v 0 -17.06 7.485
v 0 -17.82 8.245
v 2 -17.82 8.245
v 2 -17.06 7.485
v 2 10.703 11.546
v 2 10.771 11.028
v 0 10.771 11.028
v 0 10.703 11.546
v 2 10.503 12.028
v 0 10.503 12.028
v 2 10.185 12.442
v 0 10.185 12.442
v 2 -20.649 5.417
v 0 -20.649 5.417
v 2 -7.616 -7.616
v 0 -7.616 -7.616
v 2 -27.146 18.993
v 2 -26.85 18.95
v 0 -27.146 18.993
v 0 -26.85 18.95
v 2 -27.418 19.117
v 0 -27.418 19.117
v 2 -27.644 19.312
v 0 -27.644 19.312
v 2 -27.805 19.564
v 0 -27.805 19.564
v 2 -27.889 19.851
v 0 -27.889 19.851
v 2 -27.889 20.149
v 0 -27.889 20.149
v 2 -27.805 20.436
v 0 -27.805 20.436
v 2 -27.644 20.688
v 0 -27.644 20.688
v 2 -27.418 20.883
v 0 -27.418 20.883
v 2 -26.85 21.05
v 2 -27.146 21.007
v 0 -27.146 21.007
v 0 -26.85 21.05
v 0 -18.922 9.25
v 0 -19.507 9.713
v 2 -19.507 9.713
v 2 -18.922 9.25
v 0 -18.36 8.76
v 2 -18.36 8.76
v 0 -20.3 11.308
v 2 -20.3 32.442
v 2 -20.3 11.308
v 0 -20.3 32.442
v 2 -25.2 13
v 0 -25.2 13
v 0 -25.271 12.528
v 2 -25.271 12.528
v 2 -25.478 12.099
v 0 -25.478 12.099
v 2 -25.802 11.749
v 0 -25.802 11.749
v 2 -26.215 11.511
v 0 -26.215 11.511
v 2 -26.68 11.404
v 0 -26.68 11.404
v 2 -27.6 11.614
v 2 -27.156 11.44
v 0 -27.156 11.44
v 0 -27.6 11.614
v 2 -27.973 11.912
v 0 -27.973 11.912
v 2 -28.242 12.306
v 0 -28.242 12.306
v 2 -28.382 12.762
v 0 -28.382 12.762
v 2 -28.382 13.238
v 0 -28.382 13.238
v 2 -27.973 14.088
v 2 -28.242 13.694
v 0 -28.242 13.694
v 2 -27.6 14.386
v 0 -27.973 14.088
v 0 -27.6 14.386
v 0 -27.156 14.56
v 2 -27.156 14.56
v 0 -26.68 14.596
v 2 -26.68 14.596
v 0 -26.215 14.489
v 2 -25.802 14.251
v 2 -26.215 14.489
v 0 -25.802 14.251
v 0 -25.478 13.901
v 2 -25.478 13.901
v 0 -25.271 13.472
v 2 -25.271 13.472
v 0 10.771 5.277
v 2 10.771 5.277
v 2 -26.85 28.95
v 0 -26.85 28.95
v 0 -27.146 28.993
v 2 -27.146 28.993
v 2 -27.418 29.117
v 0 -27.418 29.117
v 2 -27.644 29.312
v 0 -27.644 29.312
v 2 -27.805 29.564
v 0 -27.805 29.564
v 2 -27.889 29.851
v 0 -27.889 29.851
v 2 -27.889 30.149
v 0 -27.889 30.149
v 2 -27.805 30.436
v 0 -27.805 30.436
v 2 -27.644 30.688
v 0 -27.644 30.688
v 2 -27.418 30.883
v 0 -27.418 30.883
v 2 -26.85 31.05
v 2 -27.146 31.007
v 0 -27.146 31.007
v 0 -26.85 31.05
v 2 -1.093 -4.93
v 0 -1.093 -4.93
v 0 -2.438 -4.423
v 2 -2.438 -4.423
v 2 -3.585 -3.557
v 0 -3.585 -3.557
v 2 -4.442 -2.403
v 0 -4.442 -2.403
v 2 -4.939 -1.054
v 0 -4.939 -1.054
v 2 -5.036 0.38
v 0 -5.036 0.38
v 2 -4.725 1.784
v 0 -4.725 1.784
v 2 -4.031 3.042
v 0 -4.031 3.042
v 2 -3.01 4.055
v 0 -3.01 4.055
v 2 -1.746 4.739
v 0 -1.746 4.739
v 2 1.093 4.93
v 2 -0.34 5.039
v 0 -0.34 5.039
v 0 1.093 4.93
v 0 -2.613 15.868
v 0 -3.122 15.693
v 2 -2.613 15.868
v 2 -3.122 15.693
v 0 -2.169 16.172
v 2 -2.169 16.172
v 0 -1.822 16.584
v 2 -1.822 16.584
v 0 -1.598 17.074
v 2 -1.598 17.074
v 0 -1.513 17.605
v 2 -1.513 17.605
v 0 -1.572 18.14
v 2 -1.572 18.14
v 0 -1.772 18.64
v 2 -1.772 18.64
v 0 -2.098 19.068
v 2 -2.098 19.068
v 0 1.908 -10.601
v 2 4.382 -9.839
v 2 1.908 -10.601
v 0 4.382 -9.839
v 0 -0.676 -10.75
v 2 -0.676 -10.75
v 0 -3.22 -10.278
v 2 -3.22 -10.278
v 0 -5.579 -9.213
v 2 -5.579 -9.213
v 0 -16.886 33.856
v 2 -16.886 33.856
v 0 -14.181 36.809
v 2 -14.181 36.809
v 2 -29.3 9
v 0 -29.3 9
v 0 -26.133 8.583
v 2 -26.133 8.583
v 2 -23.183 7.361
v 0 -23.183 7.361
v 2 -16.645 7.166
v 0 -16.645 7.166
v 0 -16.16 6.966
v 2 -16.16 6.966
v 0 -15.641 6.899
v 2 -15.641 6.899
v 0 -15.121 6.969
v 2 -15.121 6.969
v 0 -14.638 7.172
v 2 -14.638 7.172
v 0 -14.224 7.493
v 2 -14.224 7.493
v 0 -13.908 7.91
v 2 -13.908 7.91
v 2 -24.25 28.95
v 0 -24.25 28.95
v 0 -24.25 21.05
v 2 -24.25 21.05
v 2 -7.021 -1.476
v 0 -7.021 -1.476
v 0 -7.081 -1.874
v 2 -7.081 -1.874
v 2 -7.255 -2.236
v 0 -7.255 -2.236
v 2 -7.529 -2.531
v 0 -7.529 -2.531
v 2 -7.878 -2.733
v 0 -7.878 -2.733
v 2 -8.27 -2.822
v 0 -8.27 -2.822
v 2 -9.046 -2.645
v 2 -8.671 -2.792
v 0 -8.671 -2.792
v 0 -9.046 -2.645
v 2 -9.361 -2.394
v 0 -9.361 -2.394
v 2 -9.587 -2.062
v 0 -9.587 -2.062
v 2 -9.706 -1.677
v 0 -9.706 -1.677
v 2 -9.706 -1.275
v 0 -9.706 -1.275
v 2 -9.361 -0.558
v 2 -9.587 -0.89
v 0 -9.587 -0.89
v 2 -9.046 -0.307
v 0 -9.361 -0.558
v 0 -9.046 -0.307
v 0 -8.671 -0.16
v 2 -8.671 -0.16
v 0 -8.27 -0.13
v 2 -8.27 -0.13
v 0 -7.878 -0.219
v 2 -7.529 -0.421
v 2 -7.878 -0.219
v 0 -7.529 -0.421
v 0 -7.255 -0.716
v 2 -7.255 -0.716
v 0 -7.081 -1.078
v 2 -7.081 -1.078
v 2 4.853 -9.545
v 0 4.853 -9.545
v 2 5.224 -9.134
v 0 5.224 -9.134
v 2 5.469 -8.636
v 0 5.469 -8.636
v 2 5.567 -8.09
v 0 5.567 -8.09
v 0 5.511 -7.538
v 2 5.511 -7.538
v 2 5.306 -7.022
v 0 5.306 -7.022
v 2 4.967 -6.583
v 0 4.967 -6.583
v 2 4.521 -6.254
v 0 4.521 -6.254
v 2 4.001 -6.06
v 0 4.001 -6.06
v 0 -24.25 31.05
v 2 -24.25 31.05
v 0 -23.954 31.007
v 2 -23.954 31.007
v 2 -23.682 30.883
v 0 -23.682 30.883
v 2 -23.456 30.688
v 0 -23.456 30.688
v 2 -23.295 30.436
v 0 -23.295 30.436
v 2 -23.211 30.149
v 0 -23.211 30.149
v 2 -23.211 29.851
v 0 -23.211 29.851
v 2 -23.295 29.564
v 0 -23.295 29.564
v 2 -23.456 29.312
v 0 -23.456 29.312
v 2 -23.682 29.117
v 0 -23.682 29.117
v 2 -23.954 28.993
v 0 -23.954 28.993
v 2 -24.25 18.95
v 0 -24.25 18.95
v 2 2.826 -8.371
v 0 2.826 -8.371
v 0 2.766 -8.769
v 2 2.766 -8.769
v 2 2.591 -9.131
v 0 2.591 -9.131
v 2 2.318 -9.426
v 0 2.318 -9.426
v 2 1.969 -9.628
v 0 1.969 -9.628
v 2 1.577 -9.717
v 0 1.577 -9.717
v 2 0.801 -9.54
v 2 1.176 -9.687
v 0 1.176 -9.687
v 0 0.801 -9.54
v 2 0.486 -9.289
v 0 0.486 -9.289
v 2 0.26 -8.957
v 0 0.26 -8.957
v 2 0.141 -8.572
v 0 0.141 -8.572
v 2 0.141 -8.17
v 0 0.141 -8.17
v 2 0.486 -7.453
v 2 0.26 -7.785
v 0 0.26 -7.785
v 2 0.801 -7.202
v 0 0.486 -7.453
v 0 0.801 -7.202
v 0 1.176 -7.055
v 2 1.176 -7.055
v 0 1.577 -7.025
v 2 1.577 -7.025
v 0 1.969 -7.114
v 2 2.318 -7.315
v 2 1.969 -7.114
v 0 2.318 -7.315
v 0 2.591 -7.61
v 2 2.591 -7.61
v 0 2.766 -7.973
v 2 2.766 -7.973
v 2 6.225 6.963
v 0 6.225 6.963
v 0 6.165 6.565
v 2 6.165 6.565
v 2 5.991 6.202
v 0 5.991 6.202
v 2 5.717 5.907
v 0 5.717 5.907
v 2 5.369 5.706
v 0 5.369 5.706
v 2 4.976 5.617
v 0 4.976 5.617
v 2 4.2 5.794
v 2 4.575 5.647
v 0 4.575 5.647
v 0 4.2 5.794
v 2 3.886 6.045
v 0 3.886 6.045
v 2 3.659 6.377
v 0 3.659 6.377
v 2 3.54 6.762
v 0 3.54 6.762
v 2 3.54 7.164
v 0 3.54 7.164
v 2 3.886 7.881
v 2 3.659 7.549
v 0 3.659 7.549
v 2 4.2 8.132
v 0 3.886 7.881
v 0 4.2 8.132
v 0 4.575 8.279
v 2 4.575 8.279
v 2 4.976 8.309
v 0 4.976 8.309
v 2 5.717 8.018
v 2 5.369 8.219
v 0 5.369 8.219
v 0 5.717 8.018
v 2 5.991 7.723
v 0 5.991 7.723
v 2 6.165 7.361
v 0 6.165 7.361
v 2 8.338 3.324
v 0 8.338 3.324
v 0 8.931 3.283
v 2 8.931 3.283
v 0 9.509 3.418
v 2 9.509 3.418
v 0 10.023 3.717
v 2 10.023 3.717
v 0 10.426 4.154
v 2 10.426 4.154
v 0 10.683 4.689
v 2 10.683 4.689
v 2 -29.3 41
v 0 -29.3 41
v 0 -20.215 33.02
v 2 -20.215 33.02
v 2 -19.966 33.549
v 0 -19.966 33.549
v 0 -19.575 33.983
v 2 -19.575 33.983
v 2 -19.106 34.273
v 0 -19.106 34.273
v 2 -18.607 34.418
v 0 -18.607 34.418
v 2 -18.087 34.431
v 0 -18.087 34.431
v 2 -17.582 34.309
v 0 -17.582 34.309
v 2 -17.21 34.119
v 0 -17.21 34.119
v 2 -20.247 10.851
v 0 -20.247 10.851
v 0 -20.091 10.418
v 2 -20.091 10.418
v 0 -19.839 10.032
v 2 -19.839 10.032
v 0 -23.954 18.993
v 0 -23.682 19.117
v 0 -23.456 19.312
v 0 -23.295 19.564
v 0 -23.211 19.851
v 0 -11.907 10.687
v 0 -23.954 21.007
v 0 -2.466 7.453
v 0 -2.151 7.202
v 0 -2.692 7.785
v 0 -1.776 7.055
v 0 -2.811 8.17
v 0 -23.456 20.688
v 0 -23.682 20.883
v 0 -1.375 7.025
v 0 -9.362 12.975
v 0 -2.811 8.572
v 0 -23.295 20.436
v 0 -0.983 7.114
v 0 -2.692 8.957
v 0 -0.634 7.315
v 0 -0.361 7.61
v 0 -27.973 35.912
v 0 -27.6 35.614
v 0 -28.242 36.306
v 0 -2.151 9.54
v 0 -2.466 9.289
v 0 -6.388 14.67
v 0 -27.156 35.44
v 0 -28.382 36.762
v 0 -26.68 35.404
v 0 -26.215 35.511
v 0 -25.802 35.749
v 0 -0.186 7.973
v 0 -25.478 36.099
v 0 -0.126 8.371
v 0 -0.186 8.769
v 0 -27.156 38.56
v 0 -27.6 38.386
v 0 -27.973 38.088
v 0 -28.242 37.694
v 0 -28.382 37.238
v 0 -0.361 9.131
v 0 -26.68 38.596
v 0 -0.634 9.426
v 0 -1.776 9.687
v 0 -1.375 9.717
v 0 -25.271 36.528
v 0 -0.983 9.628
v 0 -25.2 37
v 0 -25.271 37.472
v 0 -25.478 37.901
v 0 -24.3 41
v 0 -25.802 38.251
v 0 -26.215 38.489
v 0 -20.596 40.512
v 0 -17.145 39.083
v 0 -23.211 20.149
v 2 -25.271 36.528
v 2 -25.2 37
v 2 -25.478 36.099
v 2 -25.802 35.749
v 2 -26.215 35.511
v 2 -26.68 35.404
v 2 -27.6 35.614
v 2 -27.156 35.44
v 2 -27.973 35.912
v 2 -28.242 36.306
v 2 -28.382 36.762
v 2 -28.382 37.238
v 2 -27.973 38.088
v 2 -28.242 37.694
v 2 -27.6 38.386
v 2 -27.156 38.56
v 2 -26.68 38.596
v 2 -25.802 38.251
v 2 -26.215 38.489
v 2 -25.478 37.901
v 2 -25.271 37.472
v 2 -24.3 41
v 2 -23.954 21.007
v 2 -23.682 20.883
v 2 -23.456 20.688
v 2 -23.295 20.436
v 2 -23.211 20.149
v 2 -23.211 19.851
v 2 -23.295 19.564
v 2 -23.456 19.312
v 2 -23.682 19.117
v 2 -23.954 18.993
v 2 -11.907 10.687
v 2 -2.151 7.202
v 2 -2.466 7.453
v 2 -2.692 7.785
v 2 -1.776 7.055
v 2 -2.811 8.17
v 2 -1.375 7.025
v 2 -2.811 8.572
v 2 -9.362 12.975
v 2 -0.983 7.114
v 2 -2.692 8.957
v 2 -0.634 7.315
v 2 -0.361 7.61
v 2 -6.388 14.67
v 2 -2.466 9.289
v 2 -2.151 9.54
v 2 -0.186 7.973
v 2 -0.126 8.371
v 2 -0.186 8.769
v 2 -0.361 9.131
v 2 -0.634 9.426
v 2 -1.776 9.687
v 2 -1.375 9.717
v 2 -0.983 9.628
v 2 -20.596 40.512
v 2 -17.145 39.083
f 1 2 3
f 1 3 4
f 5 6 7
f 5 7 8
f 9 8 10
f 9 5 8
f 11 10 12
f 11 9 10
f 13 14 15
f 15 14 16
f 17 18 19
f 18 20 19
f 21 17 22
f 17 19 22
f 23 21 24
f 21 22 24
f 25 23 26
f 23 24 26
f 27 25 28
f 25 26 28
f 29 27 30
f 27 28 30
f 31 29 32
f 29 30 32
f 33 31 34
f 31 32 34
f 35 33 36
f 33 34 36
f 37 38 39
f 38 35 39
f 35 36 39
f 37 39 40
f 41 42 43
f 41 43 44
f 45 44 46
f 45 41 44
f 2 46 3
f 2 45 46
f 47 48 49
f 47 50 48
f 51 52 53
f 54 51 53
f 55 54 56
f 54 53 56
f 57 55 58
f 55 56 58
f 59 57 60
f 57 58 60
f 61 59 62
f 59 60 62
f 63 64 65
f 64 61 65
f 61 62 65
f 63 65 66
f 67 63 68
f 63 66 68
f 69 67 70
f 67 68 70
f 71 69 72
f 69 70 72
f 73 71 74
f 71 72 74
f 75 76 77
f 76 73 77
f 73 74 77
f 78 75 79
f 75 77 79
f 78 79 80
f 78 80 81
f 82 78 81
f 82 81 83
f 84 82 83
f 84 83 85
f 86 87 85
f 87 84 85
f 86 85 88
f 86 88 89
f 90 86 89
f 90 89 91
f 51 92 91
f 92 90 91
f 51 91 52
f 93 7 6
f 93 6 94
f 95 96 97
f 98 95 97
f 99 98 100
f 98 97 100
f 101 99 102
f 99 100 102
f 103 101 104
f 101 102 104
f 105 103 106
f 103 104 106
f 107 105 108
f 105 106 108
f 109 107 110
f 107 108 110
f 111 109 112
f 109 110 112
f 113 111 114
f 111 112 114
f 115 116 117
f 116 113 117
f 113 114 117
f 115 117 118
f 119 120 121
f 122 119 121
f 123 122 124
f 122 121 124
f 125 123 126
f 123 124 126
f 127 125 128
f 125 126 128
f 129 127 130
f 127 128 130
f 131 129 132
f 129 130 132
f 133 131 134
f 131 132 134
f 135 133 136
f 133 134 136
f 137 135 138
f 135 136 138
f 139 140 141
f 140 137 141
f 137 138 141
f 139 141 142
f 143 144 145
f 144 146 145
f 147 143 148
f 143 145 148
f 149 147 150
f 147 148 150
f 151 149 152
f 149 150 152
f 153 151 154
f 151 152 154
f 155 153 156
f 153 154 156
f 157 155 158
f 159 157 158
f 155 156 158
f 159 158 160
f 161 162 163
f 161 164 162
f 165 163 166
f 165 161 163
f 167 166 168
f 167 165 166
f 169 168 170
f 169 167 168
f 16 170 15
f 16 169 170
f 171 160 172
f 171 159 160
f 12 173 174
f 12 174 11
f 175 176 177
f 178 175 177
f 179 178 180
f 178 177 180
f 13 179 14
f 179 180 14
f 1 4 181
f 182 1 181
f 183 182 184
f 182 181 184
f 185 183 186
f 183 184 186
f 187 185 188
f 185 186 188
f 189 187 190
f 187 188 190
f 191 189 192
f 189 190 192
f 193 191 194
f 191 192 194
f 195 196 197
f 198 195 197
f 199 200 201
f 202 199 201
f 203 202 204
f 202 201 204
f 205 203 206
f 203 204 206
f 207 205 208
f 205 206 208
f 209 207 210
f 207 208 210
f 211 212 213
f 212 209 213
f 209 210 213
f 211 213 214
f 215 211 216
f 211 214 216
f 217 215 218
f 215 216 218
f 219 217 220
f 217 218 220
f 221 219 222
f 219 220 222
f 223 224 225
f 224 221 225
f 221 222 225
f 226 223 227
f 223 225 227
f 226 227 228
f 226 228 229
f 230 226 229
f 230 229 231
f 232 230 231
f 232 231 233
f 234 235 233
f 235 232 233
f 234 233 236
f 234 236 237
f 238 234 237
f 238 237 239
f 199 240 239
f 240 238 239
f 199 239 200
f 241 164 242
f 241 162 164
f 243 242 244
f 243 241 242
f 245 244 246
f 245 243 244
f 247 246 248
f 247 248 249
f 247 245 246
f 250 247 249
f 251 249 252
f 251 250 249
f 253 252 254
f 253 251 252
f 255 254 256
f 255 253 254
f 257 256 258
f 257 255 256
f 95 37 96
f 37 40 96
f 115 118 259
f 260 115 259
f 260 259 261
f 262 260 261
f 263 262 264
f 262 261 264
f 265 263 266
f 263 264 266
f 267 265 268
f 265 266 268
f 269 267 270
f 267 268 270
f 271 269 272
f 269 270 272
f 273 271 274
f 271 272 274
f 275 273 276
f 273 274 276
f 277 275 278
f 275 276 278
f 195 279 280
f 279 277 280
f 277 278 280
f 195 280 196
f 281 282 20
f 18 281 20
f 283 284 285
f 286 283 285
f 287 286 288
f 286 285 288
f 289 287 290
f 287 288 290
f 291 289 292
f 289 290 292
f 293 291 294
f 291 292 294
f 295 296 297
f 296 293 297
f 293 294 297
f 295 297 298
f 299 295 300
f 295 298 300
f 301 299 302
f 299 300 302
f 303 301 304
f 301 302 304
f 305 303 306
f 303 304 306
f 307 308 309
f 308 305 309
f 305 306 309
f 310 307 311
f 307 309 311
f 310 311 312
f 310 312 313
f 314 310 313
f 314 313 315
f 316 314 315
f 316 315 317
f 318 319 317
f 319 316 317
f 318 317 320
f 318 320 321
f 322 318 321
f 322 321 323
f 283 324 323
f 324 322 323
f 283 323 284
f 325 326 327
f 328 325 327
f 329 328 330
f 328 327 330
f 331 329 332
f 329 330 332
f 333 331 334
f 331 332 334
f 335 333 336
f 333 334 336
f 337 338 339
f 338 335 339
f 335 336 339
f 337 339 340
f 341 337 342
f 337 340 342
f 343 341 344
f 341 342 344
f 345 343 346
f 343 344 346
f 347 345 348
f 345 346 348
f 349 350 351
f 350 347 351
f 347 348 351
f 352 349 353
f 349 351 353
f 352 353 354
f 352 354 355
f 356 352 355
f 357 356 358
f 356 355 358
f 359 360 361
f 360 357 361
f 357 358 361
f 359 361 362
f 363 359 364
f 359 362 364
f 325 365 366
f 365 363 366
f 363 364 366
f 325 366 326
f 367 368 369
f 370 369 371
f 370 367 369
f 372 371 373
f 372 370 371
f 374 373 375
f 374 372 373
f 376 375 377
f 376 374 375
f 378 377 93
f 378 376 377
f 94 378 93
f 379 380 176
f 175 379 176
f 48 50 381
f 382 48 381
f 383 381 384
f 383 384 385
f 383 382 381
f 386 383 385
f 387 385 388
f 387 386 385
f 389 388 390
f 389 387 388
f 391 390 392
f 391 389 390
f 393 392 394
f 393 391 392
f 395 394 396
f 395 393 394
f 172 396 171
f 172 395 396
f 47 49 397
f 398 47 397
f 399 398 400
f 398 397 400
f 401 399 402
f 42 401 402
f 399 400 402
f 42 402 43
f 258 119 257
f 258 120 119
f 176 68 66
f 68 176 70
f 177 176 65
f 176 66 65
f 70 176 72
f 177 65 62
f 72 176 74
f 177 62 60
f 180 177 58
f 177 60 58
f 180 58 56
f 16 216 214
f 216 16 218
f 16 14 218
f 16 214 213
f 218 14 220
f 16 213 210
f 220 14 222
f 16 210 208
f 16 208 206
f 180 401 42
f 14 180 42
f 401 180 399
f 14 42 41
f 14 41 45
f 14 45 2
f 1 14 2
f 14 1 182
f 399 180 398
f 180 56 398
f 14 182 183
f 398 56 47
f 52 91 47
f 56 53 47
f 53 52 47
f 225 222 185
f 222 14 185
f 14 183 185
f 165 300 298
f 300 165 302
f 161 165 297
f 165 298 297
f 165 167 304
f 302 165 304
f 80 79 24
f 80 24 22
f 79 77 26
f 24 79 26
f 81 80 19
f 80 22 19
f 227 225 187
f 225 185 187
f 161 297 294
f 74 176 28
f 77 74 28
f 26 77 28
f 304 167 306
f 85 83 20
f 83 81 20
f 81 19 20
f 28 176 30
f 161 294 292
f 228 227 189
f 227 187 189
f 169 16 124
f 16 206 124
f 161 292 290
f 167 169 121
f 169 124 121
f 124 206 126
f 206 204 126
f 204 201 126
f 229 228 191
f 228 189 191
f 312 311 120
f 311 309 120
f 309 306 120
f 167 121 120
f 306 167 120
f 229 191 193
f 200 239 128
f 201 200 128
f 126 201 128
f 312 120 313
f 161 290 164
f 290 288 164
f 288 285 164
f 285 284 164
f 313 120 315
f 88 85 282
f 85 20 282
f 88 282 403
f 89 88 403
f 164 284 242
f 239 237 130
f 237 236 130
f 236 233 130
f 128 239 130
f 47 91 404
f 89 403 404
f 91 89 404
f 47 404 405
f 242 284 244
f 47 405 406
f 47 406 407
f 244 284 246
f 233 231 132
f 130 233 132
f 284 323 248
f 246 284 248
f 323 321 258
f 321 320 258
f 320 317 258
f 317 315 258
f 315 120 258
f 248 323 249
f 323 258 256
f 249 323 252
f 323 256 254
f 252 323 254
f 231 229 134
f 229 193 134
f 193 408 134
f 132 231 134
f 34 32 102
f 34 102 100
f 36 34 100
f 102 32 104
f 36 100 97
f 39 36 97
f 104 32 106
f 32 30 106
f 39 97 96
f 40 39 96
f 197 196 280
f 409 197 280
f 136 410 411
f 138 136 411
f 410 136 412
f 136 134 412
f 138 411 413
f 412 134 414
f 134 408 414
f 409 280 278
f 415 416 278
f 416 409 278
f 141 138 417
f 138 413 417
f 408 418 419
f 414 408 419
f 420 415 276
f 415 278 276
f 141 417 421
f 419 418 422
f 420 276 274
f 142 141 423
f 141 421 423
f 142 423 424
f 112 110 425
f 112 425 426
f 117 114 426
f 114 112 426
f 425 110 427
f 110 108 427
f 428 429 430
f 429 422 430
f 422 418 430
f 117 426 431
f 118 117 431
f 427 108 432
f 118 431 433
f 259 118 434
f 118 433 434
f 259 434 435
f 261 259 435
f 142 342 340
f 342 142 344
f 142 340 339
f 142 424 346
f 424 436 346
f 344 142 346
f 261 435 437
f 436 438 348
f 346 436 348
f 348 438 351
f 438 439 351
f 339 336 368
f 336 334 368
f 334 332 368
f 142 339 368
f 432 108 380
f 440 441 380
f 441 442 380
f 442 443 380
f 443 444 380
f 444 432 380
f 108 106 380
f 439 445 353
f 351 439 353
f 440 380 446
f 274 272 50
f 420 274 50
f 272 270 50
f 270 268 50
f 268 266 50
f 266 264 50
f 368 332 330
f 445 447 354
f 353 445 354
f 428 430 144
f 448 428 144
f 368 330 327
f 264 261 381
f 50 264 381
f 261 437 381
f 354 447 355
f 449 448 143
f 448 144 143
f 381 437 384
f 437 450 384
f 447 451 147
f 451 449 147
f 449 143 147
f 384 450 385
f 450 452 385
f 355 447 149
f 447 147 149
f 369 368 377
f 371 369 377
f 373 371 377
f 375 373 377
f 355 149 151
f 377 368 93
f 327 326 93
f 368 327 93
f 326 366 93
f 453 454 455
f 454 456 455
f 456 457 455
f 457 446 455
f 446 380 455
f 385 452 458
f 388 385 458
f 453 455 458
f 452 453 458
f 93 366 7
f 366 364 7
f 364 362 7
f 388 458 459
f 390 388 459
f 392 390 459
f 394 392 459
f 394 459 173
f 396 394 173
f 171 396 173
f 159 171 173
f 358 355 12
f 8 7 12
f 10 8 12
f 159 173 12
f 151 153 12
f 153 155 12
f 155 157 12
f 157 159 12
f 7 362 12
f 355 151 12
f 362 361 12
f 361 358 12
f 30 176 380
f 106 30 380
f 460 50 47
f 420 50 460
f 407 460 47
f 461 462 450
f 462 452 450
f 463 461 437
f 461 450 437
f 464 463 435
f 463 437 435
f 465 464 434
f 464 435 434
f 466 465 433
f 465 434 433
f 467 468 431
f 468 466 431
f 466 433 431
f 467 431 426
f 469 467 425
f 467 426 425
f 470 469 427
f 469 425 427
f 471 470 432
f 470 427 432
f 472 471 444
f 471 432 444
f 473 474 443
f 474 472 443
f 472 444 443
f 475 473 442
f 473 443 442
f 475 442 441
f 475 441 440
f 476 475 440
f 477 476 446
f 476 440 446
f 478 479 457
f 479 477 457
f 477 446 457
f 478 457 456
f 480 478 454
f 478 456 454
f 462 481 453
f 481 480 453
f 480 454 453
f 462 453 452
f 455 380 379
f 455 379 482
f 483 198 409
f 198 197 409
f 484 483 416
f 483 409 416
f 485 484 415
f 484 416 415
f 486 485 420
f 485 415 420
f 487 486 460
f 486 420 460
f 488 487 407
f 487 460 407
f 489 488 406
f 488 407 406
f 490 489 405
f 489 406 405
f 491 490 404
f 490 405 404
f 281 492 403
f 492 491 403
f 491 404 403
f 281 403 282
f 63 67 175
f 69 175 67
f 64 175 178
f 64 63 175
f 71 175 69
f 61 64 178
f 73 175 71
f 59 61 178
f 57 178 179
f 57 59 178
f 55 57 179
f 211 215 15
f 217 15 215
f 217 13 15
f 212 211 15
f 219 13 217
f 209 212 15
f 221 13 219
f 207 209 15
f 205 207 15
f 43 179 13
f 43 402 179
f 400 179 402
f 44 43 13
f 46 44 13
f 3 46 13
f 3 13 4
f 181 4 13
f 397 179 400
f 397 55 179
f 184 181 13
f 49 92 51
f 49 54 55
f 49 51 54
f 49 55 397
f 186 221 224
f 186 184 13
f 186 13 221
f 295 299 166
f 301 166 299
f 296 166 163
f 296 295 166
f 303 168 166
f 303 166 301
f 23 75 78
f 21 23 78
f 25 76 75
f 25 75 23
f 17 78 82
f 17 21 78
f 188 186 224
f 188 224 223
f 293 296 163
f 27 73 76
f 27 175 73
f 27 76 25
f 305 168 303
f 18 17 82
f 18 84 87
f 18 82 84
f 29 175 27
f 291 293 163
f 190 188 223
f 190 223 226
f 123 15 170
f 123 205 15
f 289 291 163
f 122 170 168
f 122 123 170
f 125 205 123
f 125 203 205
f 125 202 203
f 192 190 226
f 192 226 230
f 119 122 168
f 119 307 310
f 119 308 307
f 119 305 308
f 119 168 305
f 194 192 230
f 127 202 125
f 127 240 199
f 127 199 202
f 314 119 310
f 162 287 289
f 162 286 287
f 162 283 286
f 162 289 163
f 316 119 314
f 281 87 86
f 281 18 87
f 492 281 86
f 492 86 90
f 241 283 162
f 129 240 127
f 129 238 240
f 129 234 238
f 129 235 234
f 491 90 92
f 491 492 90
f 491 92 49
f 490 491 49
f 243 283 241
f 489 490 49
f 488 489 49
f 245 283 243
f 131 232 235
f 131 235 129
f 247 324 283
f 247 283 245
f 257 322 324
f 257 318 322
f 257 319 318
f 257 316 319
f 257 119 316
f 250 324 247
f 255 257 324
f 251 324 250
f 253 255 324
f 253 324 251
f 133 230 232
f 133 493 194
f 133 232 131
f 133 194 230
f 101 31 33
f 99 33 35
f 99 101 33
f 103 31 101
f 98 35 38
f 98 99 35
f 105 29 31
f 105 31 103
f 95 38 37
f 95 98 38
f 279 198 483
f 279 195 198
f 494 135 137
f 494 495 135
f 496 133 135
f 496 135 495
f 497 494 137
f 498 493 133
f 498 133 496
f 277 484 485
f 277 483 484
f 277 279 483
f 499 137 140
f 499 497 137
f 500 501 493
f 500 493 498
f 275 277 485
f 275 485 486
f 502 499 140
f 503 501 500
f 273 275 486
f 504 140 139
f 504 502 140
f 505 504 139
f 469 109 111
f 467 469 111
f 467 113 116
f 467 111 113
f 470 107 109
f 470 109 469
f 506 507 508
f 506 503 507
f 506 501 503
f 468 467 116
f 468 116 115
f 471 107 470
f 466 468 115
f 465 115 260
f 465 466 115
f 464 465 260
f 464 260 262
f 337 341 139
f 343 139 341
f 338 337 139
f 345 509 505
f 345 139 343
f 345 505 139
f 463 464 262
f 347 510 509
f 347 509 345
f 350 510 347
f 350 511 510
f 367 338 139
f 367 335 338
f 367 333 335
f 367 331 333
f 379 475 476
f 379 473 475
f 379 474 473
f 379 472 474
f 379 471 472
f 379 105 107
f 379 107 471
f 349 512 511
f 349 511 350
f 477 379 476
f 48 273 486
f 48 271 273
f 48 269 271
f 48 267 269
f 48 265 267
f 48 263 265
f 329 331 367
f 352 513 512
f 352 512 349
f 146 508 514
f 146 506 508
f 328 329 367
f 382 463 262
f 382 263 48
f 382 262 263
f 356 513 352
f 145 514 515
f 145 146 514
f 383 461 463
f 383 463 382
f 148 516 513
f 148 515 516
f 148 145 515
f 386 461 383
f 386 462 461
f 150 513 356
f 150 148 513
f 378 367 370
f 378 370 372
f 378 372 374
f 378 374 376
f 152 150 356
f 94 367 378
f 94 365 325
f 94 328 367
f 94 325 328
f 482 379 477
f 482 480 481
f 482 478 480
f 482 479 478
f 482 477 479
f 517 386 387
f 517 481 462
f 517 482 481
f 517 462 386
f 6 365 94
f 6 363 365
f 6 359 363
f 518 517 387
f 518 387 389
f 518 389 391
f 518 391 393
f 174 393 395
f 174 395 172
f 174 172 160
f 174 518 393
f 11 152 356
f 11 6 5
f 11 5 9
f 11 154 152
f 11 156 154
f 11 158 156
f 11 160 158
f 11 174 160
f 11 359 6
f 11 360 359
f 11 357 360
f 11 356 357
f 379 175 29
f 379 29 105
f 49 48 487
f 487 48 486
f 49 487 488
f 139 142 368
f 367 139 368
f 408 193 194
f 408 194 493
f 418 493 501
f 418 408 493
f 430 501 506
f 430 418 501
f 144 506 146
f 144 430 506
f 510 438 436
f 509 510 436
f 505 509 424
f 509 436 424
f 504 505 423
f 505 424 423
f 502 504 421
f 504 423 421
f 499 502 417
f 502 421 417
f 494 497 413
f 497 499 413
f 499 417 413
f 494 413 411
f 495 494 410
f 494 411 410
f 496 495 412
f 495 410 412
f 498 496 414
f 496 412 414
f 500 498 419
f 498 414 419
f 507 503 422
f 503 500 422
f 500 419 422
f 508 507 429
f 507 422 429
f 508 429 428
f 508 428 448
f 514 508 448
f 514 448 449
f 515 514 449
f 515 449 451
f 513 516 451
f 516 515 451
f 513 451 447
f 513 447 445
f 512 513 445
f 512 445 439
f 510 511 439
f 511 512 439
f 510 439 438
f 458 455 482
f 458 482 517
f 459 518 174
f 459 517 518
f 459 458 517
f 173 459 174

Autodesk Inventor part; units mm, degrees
ref_plane "YZ Plane" through (0, 0, 0) normal (1, 0, 0) x (0, 1, 0)
ref_plane "XZ Plane" through (0, 0, 0) normal (0, 1, 0) x (-1, 0, 0)
ref_plane "XY Plane" through (0, 0, 0) normal (0, 0, 1) x (1, 0, 0)
sketch "スケッチ1" plane through (0, 0, 0) normal (1, 0, 0) x (0, 1, 0)
  line L0 (-29.3, 41) -> (-29.3, 9)
  line L1 (-29.3, 25) -> (-24.3, 25) construction
  line L2 (-26.8, 31) -> (-24.3, 31) construction
  line L3 (-24.3, 31) -> (-24.3, 19) construction
  line L4 (-24.3, 19) -> (-26.8, 19) construction
  line L5 (-26.8, 19) -> (-26.8, 31) construction
  line L6 (-26.8, 31) -> (-24.3, 19) construction
  line L7 (-24.3, 31) -> (-26.8, 19) construction
  circle A0 centre (-26.8, 37) radius 1.6
  line L8 (-26.8, 70.0011) -> (-26.8, -20.0011) construction
  line L9 (-29.3, 41) -> (-24.3, 41)
  circle A1 centre (0, 0) radius 5.05
  line L10 (-1.476, 8.3709) -> (1.476, -8.3709) construction
  circle A2 centre (-1.476, 8.3709) radius 1.35
  arc A3 (-7.6162, -7.6162) -> (10.7709, 0) centre (0, 0) ccw
  line L11 (-26.85, 31.05) -> (-24.25, 31.05)
  line L12 (-24.25, 31.05) -> (-24.25, 18.95)
  line L13 (-24.25, 18.95) -> (-26.85, 18.95)
  line L14 (-26.85, 18.95) -> (-26.85, 31.05)
  line L15 (-26.85, 31.05) -> (-24.25, 18.95) construction
  line L16 (-24.25, 31.05) -> (-26.85, 18.95) construction
  arc A4 (-24.25, 28.95) -> (-24.25, 31.05) centre (-24.25, 30) ccw
  line L17 (-25.55, 31) -> (-25.55, 19) construction
  arc A5 (-26.85, 31.05) -> (-26.85, 28.95) centre (-26.85, 30) ccw
  arc A6 (-24.25, 18.95) -> (-24.25, 21.05) centre (-24.25, 20) ccw
  arc A7 (-26.85, 21.05) -> (-26.85, 18.95) centre (-26.85, 20) ccw
  circle A8 centre (-26.8, 13) radius 1.6
  line L18 (-14.1813, 36.8087) -> (10.7709, 11.8566)
  line L19 (10.7709, 11.8566) -> (10.7709, 0)
  line L20 (-20.6489, 5.4166) -> (-7.6162, -7.6162)
  circle A9 centre (-6.9628, 4.8754) radius 1.35
  circle A10 centre (-8.3709, -1.476) radius 1.35
  circle A11 centre (0, 0) radius 16 construction
  arc A12 (-14.1813, 36.8087) -> (-24.3, 41) centre (-24.3, 26.6899) ccw
  line L21 (-20.3, 36.1924) -> (-20.3, 10.2769)
  arc A13 (-17.0097, 33.9803) -> (-20.3, 36.1924) centre (-24.3, 26.6899) ccw
  line L22 (6.7709, 10.0706) -> (6.7709, 8.438)
  circle A14 centre (-1.476, 8.3709) radius 2.4 construction
  line L23 (1.002, 15.9686) -> (-17.0097, 33.9803)
  arc A15 (-20.6489, 5.4166) -> (-29.3, 9) centre (-29.3, -3.2345) ccw
  circle A16 centre (-4.8754, -6.9628) radius 1.35
  circle A17 centre (1.476, -8.3709) radius 1.35
  arc A18 (-17.8205, 8.245) -> (-20.3, 10.2769) centre (-29.3, -3.2345) ccw
  line L24 (-1.093, -4.9303) -> (8.1951, -6.9894)
  line L25 (1.093, 4.9303) -> (10.7709, 2.7848)
  circle A19 centre (6.9628, -4.8754) radius 1.35
  circle A20 centre (8.3709, 1.476) radius 1.35
  circle A21 centre (4.8754, 6.9628) radius 1.35
  circle A22 centre (-6.9628, 4.8754) radius 2.4 construction
  circle A23 centre (-8.3709, -1.476) radius 2.4 construction
  circle A24 centre (-4.8754, -6.9628) radius 2.4 construction
  circle A25 centre (1.476, -8.3709) radius 2.4 construction
  circle A26 centre (6.9628, -4.8754) radius 2.4 construction
  circle A27 centre (8.3709, 1.476) radius 2.4 construction
  circle A28 centre (4.8754, 6.9628) radius 2.4 construction
  line L26 (6.9628, -4.8754) -> (8.3709, 1.476) construction
  line L27 (-17.8205, 8.245) -> (-15.0385, 5.463)
  arc A29 (1.002, 15.9686) -> (-15.0385, 5.463) centre (0, 0) ccw
  point P0 (-25.55, 25)
  point P1 (-26.8, 25)
  point P2 (-24.25, 21.05)
  point P3 (-26.85, 21.05)
  point P4 (-26.85, 28.95)
  point P5 (-0.8769, 4.9733)
  point P6 (0.8769, -4.9733)
  dimension "d0" = 5
  dimension "d1" = 32
  dimension "d2" = 2.5
  dimension "d3" = 12
  dimension "d4" = 3.2
  dimension "d5" = 5
  dimension "d6" = 10.1
  dimension "d7" = 17
  dimension "d8" = 2.7
  dimension "d10" = 29.3
  dimension "d11" = 1.05
  dimension "d12" = 0.05
  dimension "d13" = 0.05
  dimension "d14" = 24
  dimension "d15" = 25
  dimension "d19" = 360
  dimension "d23" = 32
  dimension "d24" = 45
  dimension "d31" = 4
  dimension "d32" = 4
  dimension "d37" = 4.8
  dimension "d46" = 4
  dimension "d47" = 4
  dimension "d53" = 360
  dimension "d56" = 10
extrude "押し出し1" add sketch "スケッチ1" along normal blind 2 contours L9 A12 L18 L19 L25 A1 L24 A3 L20 A15 L0 | A9 | A16
fillet "フィレット1" radius 2 4 edges at (1, -20.3, 36.1924) (1, -20.3, 10.2769) (1, -15.0385, 5.463) (1, 1.002, 15.9686)
fillet "フィレット2" radius 2 3 edges at (1, 10.7709, 11.8566) (1, 8.1951, -6.9894) (1, 10.7709, 2.7848)
equation "\"d13\" = d12"
properties part number "Shoulder_side_frame" material "アルミニウム 2014-T4"
